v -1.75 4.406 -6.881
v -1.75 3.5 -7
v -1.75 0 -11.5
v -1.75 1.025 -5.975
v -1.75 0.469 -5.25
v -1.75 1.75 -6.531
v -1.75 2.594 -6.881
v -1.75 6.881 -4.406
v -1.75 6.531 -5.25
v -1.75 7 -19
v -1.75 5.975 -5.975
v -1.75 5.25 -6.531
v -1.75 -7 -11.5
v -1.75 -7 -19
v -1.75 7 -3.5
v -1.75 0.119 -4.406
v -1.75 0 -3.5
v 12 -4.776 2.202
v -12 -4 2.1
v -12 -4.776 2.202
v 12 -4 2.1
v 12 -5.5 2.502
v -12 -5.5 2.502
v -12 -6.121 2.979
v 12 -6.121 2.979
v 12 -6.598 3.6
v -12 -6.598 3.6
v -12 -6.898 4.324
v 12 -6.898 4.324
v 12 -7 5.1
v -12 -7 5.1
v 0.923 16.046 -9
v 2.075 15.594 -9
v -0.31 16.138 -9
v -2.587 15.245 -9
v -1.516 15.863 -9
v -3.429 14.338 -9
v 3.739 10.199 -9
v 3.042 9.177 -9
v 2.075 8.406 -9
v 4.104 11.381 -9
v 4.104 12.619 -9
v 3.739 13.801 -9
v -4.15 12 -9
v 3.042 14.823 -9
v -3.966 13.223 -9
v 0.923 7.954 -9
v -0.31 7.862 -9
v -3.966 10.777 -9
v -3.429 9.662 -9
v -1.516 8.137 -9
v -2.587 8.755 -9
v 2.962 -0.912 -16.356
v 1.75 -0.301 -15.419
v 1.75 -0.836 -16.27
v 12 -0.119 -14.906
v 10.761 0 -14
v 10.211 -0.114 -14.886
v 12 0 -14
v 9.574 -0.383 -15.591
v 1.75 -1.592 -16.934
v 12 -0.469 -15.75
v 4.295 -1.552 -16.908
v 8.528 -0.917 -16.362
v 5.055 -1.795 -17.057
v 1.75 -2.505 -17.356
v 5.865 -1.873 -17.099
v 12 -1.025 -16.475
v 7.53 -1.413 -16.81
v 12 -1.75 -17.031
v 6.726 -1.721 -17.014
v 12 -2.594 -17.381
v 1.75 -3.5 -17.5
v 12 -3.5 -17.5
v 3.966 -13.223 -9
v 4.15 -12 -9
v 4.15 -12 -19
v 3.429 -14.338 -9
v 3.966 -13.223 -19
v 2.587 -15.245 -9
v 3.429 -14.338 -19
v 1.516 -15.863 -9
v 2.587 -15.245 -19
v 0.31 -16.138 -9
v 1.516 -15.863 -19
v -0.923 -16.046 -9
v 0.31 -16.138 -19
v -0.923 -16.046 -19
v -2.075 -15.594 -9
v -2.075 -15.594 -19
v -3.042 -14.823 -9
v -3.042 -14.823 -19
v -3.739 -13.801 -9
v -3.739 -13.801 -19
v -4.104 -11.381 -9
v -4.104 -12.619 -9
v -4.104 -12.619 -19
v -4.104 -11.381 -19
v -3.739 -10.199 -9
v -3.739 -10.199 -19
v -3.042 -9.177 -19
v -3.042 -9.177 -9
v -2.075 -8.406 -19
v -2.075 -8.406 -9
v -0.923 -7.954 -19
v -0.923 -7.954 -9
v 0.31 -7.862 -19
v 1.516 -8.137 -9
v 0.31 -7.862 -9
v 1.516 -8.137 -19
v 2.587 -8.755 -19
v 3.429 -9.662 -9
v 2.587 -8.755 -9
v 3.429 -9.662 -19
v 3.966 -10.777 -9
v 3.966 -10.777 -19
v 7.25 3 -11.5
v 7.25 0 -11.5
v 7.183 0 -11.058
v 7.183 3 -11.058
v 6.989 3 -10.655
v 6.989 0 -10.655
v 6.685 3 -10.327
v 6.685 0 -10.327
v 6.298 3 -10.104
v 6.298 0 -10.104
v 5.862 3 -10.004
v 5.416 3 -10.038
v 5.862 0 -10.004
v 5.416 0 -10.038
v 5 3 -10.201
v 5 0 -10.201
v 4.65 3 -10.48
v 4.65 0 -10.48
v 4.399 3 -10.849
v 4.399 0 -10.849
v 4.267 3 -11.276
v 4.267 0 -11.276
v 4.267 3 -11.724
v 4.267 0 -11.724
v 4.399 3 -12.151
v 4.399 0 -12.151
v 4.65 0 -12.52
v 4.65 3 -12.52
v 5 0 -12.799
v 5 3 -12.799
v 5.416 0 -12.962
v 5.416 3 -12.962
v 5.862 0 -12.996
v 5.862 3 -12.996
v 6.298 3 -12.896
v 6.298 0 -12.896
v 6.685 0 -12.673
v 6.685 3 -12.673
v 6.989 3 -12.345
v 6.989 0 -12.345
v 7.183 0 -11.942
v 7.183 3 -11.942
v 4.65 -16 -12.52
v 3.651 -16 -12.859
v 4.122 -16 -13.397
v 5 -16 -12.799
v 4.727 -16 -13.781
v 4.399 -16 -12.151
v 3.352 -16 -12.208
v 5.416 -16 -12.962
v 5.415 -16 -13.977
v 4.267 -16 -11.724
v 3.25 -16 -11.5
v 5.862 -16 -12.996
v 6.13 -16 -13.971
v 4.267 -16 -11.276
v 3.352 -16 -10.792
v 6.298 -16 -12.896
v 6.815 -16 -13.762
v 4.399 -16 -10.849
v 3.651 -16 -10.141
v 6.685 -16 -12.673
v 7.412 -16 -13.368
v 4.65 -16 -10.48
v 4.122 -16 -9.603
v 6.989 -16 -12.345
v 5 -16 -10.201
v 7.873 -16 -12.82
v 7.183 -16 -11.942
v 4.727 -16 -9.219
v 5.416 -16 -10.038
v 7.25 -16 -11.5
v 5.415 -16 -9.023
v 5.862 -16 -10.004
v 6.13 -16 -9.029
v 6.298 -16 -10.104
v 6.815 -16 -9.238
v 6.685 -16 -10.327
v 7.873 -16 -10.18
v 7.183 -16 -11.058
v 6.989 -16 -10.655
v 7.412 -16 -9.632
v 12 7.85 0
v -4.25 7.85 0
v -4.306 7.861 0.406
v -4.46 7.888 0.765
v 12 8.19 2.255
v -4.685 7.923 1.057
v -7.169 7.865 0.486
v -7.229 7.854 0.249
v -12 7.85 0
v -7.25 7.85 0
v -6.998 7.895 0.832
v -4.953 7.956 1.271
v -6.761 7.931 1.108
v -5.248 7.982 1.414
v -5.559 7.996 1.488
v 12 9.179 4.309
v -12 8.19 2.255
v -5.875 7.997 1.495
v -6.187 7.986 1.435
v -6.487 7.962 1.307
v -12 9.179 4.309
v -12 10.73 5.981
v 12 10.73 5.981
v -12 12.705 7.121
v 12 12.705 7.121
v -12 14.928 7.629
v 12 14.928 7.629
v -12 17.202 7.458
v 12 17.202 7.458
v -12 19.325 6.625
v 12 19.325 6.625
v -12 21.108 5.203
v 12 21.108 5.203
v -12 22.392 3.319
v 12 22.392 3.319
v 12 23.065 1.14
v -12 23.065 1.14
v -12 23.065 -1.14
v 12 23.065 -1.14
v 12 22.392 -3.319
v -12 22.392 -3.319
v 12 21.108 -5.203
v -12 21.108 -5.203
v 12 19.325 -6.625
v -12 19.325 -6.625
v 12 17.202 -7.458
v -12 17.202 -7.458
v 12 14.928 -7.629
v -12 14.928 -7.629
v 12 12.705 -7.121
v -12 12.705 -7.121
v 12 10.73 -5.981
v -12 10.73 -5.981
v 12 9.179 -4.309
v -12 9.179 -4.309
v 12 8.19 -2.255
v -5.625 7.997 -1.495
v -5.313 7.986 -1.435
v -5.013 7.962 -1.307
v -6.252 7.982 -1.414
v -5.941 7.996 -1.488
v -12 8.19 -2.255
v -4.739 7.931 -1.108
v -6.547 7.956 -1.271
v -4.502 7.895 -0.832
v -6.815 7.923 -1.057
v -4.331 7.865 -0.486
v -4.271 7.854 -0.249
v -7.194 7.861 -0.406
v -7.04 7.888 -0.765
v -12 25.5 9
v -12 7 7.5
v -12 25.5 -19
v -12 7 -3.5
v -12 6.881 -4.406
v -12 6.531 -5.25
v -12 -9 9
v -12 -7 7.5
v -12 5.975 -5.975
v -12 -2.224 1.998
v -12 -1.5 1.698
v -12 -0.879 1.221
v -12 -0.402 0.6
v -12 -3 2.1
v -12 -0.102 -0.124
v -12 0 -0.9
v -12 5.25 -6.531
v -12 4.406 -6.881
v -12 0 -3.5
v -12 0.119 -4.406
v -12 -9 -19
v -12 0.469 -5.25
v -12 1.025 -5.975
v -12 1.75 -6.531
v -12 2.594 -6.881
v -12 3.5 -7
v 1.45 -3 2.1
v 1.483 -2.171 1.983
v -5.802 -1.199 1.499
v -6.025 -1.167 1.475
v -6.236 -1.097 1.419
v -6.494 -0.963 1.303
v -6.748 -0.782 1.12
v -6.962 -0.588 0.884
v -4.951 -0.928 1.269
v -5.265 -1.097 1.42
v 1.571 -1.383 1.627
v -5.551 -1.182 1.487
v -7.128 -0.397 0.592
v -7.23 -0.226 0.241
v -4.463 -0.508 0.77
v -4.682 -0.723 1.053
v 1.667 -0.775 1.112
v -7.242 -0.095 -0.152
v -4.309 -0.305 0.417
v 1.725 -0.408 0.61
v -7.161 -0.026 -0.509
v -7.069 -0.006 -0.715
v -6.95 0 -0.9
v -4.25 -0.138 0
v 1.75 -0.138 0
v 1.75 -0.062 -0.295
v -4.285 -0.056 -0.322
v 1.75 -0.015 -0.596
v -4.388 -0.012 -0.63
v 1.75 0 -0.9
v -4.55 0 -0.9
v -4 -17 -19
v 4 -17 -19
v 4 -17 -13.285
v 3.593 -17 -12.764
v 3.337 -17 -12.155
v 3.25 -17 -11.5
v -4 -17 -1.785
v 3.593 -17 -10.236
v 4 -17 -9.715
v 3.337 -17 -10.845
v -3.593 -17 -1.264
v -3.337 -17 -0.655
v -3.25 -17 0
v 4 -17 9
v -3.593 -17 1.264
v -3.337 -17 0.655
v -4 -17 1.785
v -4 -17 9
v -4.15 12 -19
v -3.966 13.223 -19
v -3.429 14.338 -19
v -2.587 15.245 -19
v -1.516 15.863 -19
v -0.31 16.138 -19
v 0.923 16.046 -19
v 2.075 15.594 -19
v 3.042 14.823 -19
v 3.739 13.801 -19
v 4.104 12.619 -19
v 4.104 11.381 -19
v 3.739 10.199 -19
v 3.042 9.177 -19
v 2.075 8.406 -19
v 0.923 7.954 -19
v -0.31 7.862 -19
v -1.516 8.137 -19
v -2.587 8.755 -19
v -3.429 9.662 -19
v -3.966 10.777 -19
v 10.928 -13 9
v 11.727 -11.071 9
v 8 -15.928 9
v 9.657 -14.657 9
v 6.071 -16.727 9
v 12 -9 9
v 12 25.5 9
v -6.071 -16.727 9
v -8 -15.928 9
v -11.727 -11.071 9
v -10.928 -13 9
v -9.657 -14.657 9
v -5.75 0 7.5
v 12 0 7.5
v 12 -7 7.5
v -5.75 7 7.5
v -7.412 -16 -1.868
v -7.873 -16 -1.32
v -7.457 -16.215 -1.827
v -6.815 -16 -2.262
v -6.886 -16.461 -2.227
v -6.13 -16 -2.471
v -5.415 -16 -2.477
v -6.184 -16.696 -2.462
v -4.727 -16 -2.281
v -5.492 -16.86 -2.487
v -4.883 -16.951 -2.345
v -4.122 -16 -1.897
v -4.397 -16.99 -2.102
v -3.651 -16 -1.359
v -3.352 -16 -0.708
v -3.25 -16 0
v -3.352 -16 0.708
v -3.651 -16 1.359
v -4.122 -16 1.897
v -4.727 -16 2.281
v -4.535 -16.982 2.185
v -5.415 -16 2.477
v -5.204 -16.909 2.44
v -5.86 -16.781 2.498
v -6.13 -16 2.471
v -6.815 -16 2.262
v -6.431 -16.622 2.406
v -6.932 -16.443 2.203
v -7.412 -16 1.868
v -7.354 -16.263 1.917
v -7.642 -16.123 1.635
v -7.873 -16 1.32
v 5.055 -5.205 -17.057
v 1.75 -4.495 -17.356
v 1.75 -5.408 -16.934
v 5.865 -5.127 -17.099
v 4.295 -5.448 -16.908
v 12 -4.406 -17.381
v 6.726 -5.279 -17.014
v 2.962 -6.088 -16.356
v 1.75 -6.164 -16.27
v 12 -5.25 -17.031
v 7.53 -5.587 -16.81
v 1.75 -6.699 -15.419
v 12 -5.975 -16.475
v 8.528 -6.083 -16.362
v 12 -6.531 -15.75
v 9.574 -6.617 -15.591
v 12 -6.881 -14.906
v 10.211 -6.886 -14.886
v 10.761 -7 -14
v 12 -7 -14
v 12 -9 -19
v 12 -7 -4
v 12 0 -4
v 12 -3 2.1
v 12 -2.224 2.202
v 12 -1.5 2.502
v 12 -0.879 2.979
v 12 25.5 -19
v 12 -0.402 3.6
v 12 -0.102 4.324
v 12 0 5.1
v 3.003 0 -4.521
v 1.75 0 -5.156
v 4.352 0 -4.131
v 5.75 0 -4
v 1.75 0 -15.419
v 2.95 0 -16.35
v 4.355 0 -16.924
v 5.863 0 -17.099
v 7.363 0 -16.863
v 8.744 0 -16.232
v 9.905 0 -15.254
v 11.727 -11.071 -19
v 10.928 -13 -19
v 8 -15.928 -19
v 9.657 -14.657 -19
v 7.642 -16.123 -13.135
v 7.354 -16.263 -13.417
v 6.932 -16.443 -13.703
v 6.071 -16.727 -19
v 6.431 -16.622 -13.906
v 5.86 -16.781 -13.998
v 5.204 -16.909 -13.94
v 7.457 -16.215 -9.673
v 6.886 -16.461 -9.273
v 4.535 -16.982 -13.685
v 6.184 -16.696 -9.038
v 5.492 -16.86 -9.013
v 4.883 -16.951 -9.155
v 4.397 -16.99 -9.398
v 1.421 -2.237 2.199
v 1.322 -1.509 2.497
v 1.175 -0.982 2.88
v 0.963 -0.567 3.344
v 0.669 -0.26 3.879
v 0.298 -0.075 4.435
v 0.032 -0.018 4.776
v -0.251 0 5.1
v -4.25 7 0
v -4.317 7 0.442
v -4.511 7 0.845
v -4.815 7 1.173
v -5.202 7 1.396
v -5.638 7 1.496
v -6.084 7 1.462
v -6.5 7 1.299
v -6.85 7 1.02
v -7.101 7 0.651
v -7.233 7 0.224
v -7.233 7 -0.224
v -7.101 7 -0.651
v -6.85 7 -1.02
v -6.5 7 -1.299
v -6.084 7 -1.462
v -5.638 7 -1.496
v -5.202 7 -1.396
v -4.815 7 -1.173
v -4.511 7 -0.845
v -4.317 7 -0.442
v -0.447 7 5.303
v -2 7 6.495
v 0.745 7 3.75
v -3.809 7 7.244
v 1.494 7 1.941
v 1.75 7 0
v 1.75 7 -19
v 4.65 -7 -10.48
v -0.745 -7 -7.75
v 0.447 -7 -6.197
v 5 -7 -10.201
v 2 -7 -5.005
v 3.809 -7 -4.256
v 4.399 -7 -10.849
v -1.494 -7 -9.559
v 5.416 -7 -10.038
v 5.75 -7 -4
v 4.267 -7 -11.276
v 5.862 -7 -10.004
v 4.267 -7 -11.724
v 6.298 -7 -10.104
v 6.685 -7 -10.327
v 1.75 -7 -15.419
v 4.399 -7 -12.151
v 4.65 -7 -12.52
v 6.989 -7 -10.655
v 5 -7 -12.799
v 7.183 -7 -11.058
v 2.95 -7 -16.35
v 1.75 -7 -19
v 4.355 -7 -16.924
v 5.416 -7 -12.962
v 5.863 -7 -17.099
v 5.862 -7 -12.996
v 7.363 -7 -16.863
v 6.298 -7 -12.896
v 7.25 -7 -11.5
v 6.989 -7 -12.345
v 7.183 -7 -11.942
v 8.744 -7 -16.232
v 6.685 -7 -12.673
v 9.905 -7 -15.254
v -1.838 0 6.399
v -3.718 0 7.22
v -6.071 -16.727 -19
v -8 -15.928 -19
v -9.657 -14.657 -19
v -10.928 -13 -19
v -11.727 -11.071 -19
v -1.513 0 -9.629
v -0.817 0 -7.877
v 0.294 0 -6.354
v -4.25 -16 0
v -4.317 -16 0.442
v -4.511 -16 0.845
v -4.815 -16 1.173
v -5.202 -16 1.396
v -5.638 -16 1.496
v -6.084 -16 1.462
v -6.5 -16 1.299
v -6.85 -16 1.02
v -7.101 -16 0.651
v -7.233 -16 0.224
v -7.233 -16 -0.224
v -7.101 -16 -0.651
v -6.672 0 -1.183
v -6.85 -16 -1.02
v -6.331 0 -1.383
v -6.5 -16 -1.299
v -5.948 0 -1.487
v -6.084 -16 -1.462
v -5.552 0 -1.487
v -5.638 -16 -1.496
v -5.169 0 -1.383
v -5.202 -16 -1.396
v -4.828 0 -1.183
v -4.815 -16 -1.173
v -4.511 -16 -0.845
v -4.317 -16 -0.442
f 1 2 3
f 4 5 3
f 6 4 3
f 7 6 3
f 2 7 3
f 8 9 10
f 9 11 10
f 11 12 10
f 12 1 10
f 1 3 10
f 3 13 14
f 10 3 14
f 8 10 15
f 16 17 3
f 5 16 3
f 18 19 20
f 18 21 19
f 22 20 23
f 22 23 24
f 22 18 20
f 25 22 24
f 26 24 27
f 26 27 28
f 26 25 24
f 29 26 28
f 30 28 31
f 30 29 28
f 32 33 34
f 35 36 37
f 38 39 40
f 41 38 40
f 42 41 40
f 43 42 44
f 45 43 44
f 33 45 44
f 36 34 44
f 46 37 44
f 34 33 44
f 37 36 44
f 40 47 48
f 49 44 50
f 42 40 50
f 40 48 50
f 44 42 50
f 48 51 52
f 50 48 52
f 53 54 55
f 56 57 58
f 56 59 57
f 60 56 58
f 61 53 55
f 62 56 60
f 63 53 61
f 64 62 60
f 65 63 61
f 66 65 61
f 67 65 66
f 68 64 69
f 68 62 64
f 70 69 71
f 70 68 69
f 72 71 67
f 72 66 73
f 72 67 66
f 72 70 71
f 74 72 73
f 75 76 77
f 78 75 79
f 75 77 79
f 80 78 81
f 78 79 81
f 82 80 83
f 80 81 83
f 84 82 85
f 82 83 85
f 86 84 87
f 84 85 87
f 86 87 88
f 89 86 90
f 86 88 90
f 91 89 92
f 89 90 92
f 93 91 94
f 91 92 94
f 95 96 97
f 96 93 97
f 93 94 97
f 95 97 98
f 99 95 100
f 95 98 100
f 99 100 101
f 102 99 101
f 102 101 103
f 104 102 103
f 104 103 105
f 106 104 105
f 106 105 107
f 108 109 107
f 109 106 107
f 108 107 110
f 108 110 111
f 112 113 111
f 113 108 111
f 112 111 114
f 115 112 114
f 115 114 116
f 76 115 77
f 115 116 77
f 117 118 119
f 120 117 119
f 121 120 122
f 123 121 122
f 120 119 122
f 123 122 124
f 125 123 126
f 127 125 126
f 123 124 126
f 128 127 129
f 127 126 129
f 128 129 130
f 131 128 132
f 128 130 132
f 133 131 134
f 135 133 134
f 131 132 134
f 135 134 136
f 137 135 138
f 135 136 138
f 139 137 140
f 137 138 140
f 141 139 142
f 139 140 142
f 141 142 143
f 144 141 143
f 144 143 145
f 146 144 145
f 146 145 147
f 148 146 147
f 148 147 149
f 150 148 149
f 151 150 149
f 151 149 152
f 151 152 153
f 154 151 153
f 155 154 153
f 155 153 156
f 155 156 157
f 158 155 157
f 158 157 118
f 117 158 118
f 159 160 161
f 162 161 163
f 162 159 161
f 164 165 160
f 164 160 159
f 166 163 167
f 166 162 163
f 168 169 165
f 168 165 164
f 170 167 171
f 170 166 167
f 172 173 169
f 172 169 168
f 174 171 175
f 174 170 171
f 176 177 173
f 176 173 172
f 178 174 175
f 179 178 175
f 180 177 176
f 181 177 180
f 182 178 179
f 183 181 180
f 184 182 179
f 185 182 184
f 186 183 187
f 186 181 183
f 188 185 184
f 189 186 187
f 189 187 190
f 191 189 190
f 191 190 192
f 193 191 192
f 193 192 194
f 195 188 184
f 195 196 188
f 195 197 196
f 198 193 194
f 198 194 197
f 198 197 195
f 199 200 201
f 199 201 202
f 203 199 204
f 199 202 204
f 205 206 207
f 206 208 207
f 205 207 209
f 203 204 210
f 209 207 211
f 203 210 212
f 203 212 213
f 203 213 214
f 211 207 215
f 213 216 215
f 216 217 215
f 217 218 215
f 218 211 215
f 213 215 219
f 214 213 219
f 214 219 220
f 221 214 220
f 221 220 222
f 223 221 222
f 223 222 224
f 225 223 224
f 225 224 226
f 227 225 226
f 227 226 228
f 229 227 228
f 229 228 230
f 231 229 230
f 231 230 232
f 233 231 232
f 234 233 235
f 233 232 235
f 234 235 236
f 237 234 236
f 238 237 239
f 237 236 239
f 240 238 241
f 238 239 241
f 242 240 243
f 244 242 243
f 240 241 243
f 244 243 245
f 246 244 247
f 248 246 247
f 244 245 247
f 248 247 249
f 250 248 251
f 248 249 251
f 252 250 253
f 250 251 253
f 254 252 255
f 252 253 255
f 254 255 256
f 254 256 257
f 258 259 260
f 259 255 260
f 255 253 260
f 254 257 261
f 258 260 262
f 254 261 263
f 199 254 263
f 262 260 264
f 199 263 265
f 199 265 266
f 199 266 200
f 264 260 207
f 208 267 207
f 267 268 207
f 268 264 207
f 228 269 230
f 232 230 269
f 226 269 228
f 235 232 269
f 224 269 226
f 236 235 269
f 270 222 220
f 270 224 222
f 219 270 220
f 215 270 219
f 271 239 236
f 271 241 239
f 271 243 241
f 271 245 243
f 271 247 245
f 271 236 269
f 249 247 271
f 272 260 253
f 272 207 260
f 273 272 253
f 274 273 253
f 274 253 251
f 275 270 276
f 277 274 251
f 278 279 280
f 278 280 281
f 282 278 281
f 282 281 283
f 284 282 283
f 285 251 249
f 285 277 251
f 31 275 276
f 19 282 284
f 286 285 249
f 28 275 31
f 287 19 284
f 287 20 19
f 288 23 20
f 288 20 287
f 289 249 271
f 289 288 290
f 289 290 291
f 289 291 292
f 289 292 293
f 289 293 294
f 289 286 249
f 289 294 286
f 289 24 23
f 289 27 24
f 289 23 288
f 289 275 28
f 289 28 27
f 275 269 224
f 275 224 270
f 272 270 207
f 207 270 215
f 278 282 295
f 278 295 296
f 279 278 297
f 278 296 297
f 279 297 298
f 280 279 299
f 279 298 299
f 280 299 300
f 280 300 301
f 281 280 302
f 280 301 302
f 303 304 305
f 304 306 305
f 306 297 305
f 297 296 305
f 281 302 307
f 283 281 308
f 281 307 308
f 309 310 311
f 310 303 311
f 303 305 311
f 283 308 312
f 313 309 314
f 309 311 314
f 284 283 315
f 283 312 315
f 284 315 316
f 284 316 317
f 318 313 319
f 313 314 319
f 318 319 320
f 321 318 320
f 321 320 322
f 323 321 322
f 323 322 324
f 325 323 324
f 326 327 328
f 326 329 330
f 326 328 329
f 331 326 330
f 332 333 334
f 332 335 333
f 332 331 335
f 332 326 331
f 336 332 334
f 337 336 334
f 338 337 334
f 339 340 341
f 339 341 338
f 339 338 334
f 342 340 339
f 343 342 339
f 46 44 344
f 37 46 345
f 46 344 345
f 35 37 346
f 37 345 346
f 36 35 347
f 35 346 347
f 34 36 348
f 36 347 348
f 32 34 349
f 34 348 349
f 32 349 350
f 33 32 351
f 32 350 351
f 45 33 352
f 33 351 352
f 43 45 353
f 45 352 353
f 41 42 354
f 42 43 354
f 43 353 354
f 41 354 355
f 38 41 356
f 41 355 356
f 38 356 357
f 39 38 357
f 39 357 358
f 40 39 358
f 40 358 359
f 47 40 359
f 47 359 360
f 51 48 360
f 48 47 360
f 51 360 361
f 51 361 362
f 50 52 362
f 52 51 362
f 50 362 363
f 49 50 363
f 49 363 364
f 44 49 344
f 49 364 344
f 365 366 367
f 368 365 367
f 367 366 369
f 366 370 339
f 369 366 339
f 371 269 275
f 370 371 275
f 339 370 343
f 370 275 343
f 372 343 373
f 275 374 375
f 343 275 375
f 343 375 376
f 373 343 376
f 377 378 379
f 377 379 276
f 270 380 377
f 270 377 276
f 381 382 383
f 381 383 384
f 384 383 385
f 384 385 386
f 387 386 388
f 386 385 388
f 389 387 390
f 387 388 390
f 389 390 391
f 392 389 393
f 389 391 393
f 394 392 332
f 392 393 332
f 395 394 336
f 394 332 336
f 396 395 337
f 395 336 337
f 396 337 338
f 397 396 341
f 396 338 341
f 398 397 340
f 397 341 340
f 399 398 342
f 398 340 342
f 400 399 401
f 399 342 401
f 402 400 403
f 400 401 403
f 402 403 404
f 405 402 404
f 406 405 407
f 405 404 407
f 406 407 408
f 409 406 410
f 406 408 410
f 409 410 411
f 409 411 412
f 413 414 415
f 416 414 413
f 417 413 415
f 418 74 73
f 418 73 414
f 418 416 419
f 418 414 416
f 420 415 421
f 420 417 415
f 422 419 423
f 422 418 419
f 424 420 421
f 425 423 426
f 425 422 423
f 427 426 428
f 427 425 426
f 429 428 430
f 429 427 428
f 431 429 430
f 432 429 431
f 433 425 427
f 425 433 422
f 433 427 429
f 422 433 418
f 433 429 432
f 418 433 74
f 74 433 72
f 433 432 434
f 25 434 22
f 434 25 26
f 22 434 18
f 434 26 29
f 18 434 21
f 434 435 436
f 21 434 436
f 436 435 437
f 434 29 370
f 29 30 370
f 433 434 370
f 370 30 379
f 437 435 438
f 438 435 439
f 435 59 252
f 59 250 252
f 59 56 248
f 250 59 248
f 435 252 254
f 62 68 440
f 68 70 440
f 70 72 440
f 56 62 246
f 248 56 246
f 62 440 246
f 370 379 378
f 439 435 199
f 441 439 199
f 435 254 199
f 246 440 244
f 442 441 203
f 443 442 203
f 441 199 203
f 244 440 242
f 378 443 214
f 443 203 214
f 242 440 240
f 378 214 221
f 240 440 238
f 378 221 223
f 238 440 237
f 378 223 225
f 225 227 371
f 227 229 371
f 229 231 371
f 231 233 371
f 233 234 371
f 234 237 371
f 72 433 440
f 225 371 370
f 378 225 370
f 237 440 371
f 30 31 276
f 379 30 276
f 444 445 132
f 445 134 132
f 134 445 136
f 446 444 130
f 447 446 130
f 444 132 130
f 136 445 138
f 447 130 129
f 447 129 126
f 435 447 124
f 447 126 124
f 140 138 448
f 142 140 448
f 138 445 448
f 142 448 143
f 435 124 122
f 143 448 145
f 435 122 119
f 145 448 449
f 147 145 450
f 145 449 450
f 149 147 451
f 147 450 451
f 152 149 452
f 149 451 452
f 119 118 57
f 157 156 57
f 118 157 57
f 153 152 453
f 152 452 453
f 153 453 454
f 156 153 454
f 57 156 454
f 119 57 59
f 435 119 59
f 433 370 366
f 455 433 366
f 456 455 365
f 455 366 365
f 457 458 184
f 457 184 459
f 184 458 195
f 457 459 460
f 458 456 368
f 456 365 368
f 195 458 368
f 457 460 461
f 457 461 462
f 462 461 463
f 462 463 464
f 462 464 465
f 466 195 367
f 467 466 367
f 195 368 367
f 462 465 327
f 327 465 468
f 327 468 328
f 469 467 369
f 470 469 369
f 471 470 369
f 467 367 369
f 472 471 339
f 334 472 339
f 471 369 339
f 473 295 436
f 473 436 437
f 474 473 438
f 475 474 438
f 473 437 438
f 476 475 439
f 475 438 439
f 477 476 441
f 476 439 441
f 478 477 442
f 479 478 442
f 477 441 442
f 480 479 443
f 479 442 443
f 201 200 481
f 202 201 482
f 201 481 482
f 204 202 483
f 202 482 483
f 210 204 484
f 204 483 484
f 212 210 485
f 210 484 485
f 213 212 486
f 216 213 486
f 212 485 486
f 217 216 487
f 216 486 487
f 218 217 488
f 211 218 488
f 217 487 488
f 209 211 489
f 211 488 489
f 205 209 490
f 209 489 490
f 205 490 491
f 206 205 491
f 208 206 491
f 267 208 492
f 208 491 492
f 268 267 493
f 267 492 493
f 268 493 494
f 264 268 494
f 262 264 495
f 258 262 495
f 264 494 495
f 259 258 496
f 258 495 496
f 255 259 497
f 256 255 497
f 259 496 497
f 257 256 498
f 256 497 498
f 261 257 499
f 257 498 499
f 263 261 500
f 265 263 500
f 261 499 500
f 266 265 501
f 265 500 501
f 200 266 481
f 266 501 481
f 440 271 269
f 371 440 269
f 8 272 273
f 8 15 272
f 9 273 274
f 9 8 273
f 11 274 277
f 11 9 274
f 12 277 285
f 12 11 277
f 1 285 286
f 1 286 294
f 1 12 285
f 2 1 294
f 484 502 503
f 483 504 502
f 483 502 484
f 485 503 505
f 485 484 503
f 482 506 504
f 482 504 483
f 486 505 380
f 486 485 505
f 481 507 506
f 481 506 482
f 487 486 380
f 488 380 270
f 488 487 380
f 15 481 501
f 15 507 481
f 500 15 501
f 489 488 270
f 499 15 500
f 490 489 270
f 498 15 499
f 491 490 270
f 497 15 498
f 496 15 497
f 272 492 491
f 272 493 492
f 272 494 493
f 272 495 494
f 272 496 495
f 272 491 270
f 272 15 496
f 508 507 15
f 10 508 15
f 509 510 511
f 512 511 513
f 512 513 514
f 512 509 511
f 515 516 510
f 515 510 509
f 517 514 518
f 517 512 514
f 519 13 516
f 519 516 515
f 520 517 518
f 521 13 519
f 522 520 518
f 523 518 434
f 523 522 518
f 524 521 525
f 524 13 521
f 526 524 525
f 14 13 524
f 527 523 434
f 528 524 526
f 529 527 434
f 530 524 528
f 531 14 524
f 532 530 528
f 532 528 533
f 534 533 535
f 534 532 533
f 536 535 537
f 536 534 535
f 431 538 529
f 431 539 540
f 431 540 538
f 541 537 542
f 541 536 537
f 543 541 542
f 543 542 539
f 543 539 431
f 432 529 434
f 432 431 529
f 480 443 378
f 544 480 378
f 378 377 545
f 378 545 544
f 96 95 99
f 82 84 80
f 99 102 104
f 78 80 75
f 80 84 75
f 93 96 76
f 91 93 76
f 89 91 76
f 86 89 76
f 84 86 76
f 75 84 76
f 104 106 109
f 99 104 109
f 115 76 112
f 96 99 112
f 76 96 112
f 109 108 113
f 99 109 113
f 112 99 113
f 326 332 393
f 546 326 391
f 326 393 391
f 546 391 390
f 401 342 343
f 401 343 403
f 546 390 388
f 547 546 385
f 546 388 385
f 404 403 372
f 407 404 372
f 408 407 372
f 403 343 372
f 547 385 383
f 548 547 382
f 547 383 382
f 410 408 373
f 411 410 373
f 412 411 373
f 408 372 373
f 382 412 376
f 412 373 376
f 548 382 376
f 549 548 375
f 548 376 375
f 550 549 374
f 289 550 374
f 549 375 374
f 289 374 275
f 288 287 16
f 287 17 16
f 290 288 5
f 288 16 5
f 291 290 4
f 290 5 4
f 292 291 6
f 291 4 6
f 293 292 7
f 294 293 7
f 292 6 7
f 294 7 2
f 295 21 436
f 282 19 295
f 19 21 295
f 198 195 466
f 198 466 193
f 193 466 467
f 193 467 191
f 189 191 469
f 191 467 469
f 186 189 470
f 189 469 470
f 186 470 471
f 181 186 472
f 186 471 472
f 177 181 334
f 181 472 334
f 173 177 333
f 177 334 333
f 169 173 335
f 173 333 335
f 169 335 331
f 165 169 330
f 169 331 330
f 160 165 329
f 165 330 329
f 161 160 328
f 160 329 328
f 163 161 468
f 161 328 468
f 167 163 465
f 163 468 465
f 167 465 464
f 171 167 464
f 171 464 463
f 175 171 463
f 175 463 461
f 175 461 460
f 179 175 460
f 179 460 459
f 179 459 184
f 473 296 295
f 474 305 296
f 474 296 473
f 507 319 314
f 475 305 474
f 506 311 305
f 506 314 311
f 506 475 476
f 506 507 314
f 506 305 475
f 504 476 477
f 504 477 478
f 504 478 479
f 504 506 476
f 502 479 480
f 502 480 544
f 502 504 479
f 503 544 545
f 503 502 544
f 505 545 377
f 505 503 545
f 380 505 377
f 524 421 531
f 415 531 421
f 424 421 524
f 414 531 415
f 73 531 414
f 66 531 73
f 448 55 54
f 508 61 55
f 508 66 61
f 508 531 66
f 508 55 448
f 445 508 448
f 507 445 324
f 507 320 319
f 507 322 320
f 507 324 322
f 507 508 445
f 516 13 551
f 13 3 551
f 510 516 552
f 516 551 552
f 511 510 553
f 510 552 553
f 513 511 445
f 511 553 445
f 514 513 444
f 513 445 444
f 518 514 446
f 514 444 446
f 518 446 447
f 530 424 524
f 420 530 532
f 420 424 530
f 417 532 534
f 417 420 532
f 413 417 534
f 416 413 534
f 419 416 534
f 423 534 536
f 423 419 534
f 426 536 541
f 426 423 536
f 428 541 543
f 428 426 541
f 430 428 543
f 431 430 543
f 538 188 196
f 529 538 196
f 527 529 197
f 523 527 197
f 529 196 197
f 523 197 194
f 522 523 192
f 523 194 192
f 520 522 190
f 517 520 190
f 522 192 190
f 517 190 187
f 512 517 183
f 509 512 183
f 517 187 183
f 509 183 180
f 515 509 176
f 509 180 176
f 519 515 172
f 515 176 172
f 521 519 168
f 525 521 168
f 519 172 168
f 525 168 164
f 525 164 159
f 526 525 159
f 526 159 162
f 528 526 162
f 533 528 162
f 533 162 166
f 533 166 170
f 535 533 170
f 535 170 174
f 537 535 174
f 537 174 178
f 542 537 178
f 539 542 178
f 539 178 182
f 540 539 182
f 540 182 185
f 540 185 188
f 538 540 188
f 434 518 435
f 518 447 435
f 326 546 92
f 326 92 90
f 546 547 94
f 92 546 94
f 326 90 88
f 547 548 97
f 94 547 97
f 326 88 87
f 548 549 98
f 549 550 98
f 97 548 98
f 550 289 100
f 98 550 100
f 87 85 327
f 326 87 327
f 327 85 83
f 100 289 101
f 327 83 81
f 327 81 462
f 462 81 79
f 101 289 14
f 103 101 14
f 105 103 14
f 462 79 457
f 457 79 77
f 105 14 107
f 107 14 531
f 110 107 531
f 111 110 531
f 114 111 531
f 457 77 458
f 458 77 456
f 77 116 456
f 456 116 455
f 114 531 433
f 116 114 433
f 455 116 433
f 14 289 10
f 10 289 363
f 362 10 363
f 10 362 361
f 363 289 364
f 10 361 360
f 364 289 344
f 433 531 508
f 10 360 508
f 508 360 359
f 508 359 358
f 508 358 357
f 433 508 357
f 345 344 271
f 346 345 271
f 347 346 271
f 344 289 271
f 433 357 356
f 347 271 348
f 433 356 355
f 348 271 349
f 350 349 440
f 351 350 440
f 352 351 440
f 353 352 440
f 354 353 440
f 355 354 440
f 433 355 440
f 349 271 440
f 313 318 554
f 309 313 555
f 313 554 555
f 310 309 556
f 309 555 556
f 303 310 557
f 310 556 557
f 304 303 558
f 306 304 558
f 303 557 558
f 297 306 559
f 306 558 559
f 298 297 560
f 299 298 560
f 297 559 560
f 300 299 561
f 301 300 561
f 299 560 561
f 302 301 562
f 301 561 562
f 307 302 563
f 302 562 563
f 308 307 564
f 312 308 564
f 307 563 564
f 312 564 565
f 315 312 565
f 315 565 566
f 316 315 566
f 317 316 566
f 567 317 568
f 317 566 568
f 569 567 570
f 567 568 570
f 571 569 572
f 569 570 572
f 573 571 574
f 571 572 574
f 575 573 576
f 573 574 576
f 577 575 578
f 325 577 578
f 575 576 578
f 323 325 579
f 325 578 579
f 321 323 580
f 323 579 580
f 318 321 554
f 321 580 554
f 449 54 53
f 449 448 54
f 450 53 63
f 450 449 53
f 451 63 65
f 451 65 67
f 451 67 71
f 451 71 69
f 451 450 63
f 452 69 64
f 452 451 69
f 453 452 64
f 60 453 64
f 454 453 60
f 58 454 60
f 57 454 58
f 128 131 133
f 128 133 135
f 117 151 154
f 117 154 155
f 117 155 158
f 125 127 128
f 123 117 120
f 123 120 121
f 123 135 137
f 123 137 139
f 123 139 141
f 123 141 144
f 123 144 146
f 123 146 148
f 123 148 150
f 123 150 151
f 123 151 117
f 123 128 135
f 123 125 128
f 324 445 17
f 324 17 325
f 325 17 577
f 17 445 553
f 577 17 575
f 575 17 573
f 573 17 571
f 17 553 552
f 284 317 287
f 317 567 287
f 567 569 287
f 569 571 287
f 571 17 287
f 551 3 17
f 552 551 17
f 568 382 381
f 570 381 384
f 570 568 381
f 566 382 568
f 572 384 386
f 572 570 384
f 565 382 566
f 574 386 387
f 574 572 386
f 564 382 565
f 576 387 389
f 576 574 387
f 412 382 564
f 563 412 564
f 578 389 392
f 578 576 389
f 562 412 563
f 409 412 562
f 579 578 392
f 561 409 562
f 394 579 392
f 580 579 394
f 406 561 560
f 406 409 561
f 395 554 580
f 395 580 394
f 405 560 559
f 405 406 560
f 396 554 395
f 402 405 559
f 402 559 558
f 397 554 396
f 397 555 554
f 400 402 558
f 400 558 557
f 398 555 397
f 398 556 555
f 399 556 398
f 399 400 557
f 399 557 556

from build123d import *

# Parameters (mm, degrees)
SKETCH_1_W           = 24
SKETCH_1_H           = 36
EXTRUDE_1_DEPTH      = 19
CUT_EXTRUDE_2_DEPTH  = 3.5
SKETCH_4_W           = 5.4
SKETCH_4_H           = 7
CUT_EXTRUDE_3_DEPTH  = 36.510561809
CUT_EXTRUDE_4_DEPTH  = 3.5
SKETCH_6_R           = 4.15
CUT_EXTRUDE_5_DEPTH  = 44.726422218
FILLET_2_R           = 3
SKETCH_10_W          = 10
SKETCH_10_H          = 36
CUT_EXTRUDE_9_DEPTH  = 36.510561809
SKETCH_11_W          = 28
SKETCH_11_H          = 16.5
EXTRUDE_3_DEPTH      = 24
SKETCH_12_W          = 10.25
SKETCH_12_H          = 12
EXTRUDE_4_DEPTH      = 7
FILLET_3_R           = 3.5
SKETCH_13_W          = 10.25
SKETCH_13_H          = 1.5
EXTRUDE_5_DEPTH      = 7
FILLET_4_R           = 3.5
SKETCH_14_R          = 5.6
CUT_EXTRUDE_10_DEPTH = 7
FILLET_6_R           = 3
EXTRUDE_START        = -18
SKETCH_16_R          = 4.15
EXTRUDE_6_DEPTH      = 18
SKETCH_17_R          = 7.65
SKETCH_17_W          = 28
SKETCH_17_H          = 17.5
SKETCH_17_H_2        = 9
CUT_EXTRUDE_11_DEPTH = 47.122120558
FILLET_7_R           = 8
SKETCH_18_R          = 1.5
CUT_EXTRUDE_12_DEPTH = 26
SKETCH_19_R          = 1.5
CUT_EXTRUDE_13_DEPTH = 20
SKETCH_20_R          = 2.5
CUT_EXTRUDE_14_DEPTH = 1


with BuildPart() as part:
    # 草图1 → 凸台-拉伸1 (new, symmetric)
    with BuildSketch(Plane.XY):
        Rectangle(SKETCH_1_W, SKETCH_1_H)
    extrude(amount=EXTRUDE_1_DEPTH, both=True)

    # 草图3 → 切除-拉伸2 (cut, symmetric)
    with BuildSketch(Plane(origin=(0, 3.5, 0), x_dir=(1, 0, 0), z_dir=(0, 1, 0))):
        with BuildLine():
            Line((-5.75, -7.5), (-12, -7.5))
            Line((-12, -7.5), (-12, 19))
            Line((-12, 19), (1.75, 19))
            Line((1.75, 19), (1.75, 0))
            ThreePointArc((1.75, 0), (-0.446699141, -5.303300859), (-5.75, -7.5))
        make_face()
    extrude(amount=CUT_EXTRUDE_2_DEPTH, both=True, mode=Mode.SUBTRACT)

    # 草图4 → 切除-拉伸3 (cut, through all)
    with BuildSketch(Plane.ZY.offset(12)):
        with Locations((4.8, -3.5)):
            Rectangle(SKETCH_4_W, SKETCH_4_H)
    extrude(amount=-CUT_EXTRUDE_3_DEPTH, mode=Mode.SUBTRACT)

    # 草图5 → 切除-拉伸4 (cut, symmetric)
    with BuildSketch(Plane(origin=(0, -3.5, 0), x_dir=(1, 0, 0), z_dir=(0, 1, 0))):
        with BuildLine():
            Line((5.75, 4), (12, 4))
            Line((12, 4), (12, 19))
            Line((12, 19), (-1.75, 19))
            Line((-1.75, 19), (-1.75, 11.5))
            ThreePointArc((-1.75, 11.5), (0.446699141, 6.196699141), (5.75, 4))
        make_face()
    extrude(amount=CUT_EXTRUDE_4_DEPTH, both=True, mode=Mode.SUBTRACT)

    # 草图6 → 切除-拉伸5 (cut, through all)
    with BuildSketch(Plane(origin=(0, 0, -19), x_dir=(-1, 0, 0), z_dir=(0, 0, -1))):
        with Locations((0, 12)):
            Circle(SKETCH_6_R)
        with Locations(Location((0, -12, 0), (0, 0, 180))):
            Circle(SKETCH_6_R)
    extrude(amount=-CUT_EXTRUDE_5_DEPTH, mode=Mode.SUBTRACT)

    # 圆角2
    fillet_2_edges = [part.edges().sort_by_distance(p)[0] for p in [
        (6.725, 0, 2.1),
        (0, -7, 2.1),
    ]]
    fillet(fillet_2_edges, radius=FILLET_2_R)

    # 草图10 → 切除-拉伸9 (cut, through all)
    with BuildSketch(Plane(origin=(12, 0, 0), x_dir=(0, 0, -1), z_dir=(1, 0, 0))):
        with Locations((-14, 0)):
            Rectangle(SKETCH_10_W, SKETCH_10_H)
    extrude(amount=-CUT_EXTRUDE_9_DEPTH, mode=Mode.SUBTRACT)

    # 草图11 → 凸台-拉伸3 (add)
    with BuildSketch(Plane.ZY.offset(12)):
        with Locations((-5, -26.25)):
            Rectangle(SKETCH_11_W, SKETCH_11_H)
    extrude_3 = extrude(amount=-EXTRUDE_3_DEPTH)

    # 镜向2: 凸台-拉伸3 across plane
    add(extrude_3.mirror(Plane.ZX))

    # 草图12 → 凸台-拉伸4 (add)
    with BuildSketch(Plane(origin=(0, 0, 0), x_dir=(1, 0, 0), z_dir=(0, 1, 0))):
        with Locations((-6.875, 13)):
            Rectangle(SKETCH_12_W, SKETCH_12_H)
    extrude(amount=EXTRUDE_4_DEPTH)

    # 圆角3
    fillet_3_edges = [part.edges().sort_by_distance(p)[0] for p in [
        (-6.875, 0, -7),
        (-6.875, 7, -7),
    ]]
    fillet(fillet_3_edges, radius=FILLET_3_R - 0.0001)  # a hair under: the kernel refuses the full size

    # 草图13 → 凸台-拉伸5 (add)
    with BuildSketch(Plane.XZ):
        with Locations((6.875, -18.25)):
            Rectangle(SKETCH_13_W, SKETCH_13_H)
    extrude(amount=EXTRUDE_5_DEPTH)

    # 圆角4
    fillet_4_edges = [part.edges().sort_by_distance(p)[0] for p in [
        (6.875, 0, -17.5),
        (6.875, -7, -17.5),
    ]]
    fillet(fillet_4_edges, radius=FILLET_4_R - 0.0001)  # a hair under: the kernel refuses the full size

    # 草图14 → 切除-拉伸10 (cut)
    with BuildSketch(Plane.XZ):
        with Locations((5.75, -11.5)):
            Circle(SKETCH_14_R)
    extrude(amount=CUT_EXTRUDE_10_DEPTH, mode=Mode.SUBTRACT)

    # 圆角6
    fillet_6_edges = [part.edges().sort_by_distance(p)[0] for p in [
        (-5.275, 0, 2.1),
    ]]
    fillet(fillet_6_edges, radius=FILLET_6_R)

    # 草图16 → 凸台-拉伸6 (add)
    with BuildSketch(Plane.XY.offset(9).offset(EXTRUDE_START)):
        with Locations((0, -12)):
            Circle(SKETCH_16_R)
        with Locations(Location((0, 12, 0), (0, 0, 180))):
            Circle(SKETCH_16_R)
    extrude(amount=EXTRUDE_6_DEPTH)

    # 草图17 → 切除-拉伸11 (cut, through all)
    with BuildSketch(Plane.ZY.offset(12)):
        with Locations(Location((0, 15.5, 0), (0, 0, 270))):
            Circle(SKETCH_17_R)
        with Locations((-5, -25.75)):
            Rectangle(SKETCH_17_W, SKETCH_17_H)
        with Locations((-5, 30)):
            Rectangle(SKETCH_17_W, SKETCH_17_H_2)
    extrude(amount=-CUT_EXTRUDE_11_DEPTH, mode=Mode.SUBTRACT)

    # 圆角7
    fillet_7_edges = [part.edges().sort_by_distance(p)[0] for p in [
        (12, -17, -5),
        (-12, -17, -5),
    ]]
    fillet(fillet_7_edges, radius=FILLET_7_R)

    # 草图18 → 切除-拉伸12 (cut)
    with BuildSketch(Plane.XZ.offset(17)):
        with Locations((-5.75, 0)):
            Circle(SKETCH_18_R)
    extrude(amount=-CUT_EXTRUDE_12_DEPTH, mode=Mode.SUBTRACT)

    # 草图19 → 切除-拉伸13 (cut)
    with BuildSketch(Plane.XZ.offset(17)):
        with Locations((5.75, -11.5)):
            Circle(SKETCH_19_R)
    extrude(amount=-CUT_EXTRUDE_13_DEPTH, mode=Mode.SUBTRACT)

    # 草图20 → 切除-拉伸14 (cut)
    with BuildSketch(Plane.XZ.offset(17)):
        with Locations((5.75, -11.5)):
            Circle(SKETCH_20_R)
        with Locations((-5.75, 0)):
            Circle(SKETCH_20_R)
    extrude(amount=-CUT_EXTRUDE_14_DEPTH, mode=Mode.SUBTRACT)


solid = part.part
